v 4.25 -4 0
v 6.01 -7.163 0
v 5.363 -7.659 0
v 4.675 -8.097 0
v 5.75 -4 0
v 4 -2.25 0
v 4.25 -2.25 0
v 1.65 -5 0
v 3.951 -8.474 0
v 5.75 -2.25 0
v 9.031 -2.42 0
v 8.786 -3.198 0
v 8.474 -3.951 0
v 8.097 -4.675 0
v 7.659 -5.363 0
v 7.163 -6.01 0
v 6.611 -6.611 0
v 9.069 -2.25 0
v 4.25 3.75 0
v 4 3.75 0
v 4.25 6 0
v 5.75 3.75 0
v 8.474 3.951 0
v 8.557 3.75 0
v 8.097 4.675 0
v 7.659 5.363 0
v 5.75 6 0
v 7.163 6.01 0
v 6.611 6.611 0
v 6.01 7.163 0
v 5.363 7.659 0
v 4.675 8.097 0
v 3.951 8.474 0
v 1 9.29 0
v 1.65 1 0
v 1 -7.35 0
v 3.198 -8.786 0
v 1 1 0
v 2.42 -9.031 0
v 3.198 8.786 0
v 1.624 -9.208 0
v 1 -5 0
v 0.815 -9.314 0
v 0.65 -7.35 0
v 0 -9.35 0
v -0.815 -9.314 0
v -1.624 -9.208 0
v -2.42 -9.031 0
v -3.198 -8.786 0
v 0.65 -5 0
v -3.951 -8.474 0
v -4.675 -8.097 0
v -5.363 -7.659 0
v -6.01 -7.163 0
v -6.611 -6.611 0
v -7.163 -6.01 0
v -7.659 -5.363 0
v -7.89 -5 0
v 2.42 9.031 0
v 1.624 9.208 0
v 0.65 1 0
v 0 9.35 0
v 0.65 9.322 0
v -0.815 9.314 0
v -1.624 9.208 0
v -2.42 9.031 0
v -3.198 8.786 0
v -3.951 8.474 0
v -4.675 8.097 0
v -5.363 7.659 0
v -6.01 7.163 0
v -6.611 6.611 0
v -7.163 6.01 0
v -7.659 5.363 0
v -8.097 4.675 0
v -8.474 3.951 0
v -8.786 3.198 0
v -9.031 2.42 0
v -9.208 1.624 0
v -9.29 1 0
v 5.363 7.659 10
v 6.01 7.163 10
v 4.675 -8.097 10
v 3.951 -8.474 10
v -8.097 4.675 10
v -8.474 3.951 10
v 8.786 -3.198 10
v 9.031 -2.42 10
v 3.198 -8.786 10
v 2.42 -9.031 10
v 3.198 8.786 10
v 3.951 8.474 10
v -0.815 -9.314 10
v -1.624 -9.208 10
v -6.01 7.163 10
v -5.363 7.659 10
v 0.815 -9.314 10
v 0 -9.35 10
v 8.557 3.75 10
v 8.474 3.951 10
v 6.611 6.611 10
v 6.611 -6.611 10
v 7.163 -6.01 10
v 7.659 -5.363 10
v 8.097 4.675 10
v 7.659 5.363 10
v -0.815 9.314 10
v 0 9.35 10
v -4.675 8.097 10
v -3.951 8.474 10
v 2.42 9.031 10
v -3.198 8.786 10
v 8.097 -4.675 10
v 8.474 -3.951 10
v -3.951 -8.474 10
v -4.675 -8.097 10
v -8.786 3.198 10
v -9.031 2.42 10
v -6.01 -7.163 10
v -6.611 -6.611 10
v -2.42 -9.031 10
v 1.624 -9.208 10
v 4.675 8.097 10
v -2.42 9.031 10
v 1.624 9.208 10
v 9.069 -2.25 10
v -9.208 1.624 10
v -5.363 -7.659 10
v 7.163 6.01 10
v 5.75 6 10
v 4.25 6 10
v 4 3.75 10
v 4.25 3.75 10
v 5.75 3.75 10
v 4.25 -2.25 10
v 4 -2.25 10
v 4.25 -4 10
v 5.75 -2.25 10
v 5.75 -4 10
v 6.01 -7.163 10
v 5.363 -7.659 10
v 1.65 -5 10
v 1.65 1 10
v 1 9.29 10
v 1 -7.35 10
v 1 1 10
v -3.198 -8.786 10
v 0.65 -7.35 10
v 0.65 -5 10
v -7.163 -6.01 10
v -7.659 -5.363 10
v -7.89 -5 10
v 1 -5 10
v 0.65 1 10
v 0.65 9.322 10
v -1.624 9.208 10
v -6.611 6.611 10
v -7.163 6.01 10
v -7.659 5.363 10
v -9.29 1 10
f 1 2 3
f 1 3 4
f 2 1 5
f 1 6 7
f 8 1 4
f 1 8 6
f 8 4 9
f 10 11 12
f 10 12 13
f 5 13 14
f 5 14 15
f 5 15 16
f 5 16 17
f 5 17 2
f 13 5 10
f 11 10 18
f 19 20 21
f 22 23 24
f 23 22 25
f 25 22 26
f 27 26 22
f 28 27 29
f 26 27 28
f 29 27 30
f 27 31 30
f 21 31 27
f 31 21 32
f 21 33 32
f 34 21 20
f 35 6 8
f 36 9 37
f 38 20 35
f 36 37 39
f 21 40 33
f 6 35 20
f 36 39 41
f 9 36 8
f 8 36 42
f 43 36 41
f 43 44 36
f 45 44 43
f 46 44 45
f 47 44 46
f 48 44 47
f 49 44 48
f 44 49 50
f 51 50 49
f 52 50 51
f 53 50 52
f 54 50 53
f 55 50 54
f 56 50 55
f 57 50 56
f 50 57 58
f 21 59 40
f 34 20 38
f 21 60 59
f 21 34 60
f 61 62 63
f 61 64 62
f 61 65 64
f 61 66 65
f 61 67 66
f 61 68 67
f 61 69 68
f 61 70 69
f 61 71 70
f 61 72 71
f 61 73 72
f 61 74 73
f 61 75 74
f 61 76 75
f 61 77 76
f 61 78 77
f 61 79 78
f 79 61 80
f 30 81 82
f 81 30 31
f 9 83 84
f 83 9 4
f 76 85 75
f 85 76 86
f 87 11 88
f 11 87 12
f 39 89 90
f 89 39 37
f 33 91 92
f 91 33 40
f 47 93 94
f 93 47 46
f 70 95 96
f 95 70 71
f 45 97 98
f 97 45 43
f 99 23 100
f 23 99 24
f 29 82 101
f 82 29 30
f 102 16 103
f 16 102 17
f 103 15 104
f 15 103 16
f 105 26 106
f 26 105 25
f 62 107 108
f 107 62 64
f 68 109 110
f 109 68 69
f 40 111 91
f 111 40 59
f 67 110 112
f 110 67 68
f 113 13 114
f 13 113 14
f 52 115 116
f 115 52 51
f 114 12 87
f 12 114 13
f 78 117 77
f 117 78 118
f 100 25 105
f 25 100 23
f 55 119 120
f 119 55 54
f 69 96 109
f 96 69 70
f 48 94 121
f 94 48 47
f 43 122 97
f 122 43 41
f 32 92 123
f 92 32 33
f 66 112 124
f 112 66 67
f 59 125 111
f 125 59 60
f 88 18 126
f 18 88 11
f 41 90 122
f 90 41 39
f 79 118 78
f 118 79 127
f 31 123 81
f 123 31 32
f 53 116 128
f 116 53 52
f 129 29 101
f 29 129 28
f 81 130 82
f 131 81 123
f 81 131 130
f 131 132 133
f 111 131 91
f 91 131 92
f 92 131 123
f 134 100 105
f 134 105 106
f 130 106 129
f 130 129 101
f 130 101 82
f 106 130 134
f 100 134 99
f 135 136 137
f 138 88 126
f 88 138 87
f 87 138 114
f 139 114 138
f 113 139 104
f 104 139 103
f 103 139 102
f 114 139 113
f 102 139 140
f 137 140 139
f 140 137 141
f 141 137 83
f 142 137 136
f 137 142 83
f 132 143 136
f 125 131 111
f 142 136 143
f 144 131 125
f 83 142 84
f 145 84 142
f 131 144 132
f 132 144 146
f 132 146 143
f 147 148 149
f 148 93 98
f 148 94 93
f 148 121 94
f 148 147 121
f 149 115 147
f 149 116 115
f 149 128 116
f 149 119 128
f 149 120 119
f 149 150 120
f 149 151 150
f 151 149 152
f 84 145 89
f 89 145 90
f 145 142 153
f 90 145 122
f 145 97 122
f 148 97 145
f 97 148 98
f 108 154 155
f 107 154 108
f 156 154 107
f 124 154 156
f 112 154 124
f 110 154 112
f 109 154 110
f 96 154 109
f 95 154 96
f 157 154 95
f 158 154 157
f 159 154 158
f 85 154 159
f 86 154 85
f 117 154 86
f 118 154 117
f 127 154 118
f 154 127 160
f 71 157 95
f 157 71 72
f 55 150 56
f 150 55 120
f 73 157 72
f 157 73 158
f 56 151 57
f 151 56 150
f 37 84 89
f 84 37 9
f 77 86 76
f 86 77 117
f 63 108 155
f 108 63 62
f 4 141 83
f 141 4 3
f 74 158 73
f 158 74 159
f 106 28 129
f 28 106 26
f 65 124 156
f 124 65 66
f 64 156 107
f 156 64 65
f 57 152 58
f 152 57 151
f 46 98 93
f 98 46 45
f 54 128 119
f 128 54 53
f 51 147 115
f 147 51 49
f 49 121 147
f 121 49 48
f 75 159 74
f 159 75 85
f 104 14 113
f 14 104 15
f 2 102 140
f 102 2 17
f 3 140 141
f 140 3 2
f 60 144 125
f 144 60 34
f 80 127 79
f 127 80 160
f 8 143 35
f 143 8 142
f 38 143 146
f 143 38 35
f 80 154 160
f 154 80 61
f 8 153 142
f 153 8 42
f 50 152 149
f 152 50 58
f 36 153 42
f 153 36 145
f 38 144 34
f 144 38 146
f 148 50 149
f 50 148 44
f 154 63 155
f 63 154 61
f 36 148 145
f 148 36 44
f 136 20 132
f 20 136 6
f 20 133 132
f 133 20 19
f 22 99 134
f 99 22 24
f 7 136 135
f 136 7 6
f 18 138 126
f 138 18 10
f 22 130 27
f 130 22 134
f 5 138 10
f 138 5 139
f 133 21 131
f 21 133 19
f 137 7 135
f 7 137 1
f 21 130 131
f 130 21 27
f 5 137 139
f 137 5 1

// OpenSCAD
// Stand-off clip - a ring that snaps onto a round stand rod, with a separate ring for a
// piece of tubing, joined by a solid bridge. Printed flat (the ring planes are parallel to the
// XY plane) so it drops onto a rod and snaps into place. NOVEL general part.
//

stand_d  = 12.7;
tube_d   = 6;
bridge_w = 6;
height   = 10;

$fn = 72;

ring_d = stand_d + 2 * 3;          // outer diameter of the stand ring
open   = 10;                       // opening in the stand ring (-X side)
g      = min(1.5, stand_d / 2 - 3 - open / 2);   // keep the rod hole open even with the opening

t  = tube_d + 2 * 2;               // outer diameter of the tubing ring
open_t = 4.5;
g_t   = min(1.5, tube_d / 2 - 2 - open_t / 2);

difference() {
    union() {
        cylinder(h = height, d = ring_d);                 // stand ring (solid)
        cylinder(h = height, d = t);                      // tubing ring (solid)
        translate([-(bridge_w / 2), 0, 0]) cube([bridge_w, 6, height]);   // bridge
    }
    // cut the opening in the stand ring
    translate([-ring_d / 2 - 1, -open / 2, 0]) cube([open + 2, 6, height]);
    // keep a guide wall near the rod: a wall 1.5 mm thick for x in [-g, g]
    translate([-g - 1, -stand_d / 2 - 1, 0]) cube([g + 1 + 1, stand_d + 4, height]);
    // cut the opening in the tubing ring
    translate([t / 2 - 1, -open_t / 2, 0]) cube([open_t + 2, 6, height]);
    // keep a guide wall near the tube centre: a wall 1.5 mm thick for x in [t / 2 - g_t - 1, t / 2 - g_t + 1]
    translate([t / 2 - g_t - 2, -tube_d / 2 - 1, 0]) cube([g_t * 2 + 4, tube_d + 4, height]);
}
